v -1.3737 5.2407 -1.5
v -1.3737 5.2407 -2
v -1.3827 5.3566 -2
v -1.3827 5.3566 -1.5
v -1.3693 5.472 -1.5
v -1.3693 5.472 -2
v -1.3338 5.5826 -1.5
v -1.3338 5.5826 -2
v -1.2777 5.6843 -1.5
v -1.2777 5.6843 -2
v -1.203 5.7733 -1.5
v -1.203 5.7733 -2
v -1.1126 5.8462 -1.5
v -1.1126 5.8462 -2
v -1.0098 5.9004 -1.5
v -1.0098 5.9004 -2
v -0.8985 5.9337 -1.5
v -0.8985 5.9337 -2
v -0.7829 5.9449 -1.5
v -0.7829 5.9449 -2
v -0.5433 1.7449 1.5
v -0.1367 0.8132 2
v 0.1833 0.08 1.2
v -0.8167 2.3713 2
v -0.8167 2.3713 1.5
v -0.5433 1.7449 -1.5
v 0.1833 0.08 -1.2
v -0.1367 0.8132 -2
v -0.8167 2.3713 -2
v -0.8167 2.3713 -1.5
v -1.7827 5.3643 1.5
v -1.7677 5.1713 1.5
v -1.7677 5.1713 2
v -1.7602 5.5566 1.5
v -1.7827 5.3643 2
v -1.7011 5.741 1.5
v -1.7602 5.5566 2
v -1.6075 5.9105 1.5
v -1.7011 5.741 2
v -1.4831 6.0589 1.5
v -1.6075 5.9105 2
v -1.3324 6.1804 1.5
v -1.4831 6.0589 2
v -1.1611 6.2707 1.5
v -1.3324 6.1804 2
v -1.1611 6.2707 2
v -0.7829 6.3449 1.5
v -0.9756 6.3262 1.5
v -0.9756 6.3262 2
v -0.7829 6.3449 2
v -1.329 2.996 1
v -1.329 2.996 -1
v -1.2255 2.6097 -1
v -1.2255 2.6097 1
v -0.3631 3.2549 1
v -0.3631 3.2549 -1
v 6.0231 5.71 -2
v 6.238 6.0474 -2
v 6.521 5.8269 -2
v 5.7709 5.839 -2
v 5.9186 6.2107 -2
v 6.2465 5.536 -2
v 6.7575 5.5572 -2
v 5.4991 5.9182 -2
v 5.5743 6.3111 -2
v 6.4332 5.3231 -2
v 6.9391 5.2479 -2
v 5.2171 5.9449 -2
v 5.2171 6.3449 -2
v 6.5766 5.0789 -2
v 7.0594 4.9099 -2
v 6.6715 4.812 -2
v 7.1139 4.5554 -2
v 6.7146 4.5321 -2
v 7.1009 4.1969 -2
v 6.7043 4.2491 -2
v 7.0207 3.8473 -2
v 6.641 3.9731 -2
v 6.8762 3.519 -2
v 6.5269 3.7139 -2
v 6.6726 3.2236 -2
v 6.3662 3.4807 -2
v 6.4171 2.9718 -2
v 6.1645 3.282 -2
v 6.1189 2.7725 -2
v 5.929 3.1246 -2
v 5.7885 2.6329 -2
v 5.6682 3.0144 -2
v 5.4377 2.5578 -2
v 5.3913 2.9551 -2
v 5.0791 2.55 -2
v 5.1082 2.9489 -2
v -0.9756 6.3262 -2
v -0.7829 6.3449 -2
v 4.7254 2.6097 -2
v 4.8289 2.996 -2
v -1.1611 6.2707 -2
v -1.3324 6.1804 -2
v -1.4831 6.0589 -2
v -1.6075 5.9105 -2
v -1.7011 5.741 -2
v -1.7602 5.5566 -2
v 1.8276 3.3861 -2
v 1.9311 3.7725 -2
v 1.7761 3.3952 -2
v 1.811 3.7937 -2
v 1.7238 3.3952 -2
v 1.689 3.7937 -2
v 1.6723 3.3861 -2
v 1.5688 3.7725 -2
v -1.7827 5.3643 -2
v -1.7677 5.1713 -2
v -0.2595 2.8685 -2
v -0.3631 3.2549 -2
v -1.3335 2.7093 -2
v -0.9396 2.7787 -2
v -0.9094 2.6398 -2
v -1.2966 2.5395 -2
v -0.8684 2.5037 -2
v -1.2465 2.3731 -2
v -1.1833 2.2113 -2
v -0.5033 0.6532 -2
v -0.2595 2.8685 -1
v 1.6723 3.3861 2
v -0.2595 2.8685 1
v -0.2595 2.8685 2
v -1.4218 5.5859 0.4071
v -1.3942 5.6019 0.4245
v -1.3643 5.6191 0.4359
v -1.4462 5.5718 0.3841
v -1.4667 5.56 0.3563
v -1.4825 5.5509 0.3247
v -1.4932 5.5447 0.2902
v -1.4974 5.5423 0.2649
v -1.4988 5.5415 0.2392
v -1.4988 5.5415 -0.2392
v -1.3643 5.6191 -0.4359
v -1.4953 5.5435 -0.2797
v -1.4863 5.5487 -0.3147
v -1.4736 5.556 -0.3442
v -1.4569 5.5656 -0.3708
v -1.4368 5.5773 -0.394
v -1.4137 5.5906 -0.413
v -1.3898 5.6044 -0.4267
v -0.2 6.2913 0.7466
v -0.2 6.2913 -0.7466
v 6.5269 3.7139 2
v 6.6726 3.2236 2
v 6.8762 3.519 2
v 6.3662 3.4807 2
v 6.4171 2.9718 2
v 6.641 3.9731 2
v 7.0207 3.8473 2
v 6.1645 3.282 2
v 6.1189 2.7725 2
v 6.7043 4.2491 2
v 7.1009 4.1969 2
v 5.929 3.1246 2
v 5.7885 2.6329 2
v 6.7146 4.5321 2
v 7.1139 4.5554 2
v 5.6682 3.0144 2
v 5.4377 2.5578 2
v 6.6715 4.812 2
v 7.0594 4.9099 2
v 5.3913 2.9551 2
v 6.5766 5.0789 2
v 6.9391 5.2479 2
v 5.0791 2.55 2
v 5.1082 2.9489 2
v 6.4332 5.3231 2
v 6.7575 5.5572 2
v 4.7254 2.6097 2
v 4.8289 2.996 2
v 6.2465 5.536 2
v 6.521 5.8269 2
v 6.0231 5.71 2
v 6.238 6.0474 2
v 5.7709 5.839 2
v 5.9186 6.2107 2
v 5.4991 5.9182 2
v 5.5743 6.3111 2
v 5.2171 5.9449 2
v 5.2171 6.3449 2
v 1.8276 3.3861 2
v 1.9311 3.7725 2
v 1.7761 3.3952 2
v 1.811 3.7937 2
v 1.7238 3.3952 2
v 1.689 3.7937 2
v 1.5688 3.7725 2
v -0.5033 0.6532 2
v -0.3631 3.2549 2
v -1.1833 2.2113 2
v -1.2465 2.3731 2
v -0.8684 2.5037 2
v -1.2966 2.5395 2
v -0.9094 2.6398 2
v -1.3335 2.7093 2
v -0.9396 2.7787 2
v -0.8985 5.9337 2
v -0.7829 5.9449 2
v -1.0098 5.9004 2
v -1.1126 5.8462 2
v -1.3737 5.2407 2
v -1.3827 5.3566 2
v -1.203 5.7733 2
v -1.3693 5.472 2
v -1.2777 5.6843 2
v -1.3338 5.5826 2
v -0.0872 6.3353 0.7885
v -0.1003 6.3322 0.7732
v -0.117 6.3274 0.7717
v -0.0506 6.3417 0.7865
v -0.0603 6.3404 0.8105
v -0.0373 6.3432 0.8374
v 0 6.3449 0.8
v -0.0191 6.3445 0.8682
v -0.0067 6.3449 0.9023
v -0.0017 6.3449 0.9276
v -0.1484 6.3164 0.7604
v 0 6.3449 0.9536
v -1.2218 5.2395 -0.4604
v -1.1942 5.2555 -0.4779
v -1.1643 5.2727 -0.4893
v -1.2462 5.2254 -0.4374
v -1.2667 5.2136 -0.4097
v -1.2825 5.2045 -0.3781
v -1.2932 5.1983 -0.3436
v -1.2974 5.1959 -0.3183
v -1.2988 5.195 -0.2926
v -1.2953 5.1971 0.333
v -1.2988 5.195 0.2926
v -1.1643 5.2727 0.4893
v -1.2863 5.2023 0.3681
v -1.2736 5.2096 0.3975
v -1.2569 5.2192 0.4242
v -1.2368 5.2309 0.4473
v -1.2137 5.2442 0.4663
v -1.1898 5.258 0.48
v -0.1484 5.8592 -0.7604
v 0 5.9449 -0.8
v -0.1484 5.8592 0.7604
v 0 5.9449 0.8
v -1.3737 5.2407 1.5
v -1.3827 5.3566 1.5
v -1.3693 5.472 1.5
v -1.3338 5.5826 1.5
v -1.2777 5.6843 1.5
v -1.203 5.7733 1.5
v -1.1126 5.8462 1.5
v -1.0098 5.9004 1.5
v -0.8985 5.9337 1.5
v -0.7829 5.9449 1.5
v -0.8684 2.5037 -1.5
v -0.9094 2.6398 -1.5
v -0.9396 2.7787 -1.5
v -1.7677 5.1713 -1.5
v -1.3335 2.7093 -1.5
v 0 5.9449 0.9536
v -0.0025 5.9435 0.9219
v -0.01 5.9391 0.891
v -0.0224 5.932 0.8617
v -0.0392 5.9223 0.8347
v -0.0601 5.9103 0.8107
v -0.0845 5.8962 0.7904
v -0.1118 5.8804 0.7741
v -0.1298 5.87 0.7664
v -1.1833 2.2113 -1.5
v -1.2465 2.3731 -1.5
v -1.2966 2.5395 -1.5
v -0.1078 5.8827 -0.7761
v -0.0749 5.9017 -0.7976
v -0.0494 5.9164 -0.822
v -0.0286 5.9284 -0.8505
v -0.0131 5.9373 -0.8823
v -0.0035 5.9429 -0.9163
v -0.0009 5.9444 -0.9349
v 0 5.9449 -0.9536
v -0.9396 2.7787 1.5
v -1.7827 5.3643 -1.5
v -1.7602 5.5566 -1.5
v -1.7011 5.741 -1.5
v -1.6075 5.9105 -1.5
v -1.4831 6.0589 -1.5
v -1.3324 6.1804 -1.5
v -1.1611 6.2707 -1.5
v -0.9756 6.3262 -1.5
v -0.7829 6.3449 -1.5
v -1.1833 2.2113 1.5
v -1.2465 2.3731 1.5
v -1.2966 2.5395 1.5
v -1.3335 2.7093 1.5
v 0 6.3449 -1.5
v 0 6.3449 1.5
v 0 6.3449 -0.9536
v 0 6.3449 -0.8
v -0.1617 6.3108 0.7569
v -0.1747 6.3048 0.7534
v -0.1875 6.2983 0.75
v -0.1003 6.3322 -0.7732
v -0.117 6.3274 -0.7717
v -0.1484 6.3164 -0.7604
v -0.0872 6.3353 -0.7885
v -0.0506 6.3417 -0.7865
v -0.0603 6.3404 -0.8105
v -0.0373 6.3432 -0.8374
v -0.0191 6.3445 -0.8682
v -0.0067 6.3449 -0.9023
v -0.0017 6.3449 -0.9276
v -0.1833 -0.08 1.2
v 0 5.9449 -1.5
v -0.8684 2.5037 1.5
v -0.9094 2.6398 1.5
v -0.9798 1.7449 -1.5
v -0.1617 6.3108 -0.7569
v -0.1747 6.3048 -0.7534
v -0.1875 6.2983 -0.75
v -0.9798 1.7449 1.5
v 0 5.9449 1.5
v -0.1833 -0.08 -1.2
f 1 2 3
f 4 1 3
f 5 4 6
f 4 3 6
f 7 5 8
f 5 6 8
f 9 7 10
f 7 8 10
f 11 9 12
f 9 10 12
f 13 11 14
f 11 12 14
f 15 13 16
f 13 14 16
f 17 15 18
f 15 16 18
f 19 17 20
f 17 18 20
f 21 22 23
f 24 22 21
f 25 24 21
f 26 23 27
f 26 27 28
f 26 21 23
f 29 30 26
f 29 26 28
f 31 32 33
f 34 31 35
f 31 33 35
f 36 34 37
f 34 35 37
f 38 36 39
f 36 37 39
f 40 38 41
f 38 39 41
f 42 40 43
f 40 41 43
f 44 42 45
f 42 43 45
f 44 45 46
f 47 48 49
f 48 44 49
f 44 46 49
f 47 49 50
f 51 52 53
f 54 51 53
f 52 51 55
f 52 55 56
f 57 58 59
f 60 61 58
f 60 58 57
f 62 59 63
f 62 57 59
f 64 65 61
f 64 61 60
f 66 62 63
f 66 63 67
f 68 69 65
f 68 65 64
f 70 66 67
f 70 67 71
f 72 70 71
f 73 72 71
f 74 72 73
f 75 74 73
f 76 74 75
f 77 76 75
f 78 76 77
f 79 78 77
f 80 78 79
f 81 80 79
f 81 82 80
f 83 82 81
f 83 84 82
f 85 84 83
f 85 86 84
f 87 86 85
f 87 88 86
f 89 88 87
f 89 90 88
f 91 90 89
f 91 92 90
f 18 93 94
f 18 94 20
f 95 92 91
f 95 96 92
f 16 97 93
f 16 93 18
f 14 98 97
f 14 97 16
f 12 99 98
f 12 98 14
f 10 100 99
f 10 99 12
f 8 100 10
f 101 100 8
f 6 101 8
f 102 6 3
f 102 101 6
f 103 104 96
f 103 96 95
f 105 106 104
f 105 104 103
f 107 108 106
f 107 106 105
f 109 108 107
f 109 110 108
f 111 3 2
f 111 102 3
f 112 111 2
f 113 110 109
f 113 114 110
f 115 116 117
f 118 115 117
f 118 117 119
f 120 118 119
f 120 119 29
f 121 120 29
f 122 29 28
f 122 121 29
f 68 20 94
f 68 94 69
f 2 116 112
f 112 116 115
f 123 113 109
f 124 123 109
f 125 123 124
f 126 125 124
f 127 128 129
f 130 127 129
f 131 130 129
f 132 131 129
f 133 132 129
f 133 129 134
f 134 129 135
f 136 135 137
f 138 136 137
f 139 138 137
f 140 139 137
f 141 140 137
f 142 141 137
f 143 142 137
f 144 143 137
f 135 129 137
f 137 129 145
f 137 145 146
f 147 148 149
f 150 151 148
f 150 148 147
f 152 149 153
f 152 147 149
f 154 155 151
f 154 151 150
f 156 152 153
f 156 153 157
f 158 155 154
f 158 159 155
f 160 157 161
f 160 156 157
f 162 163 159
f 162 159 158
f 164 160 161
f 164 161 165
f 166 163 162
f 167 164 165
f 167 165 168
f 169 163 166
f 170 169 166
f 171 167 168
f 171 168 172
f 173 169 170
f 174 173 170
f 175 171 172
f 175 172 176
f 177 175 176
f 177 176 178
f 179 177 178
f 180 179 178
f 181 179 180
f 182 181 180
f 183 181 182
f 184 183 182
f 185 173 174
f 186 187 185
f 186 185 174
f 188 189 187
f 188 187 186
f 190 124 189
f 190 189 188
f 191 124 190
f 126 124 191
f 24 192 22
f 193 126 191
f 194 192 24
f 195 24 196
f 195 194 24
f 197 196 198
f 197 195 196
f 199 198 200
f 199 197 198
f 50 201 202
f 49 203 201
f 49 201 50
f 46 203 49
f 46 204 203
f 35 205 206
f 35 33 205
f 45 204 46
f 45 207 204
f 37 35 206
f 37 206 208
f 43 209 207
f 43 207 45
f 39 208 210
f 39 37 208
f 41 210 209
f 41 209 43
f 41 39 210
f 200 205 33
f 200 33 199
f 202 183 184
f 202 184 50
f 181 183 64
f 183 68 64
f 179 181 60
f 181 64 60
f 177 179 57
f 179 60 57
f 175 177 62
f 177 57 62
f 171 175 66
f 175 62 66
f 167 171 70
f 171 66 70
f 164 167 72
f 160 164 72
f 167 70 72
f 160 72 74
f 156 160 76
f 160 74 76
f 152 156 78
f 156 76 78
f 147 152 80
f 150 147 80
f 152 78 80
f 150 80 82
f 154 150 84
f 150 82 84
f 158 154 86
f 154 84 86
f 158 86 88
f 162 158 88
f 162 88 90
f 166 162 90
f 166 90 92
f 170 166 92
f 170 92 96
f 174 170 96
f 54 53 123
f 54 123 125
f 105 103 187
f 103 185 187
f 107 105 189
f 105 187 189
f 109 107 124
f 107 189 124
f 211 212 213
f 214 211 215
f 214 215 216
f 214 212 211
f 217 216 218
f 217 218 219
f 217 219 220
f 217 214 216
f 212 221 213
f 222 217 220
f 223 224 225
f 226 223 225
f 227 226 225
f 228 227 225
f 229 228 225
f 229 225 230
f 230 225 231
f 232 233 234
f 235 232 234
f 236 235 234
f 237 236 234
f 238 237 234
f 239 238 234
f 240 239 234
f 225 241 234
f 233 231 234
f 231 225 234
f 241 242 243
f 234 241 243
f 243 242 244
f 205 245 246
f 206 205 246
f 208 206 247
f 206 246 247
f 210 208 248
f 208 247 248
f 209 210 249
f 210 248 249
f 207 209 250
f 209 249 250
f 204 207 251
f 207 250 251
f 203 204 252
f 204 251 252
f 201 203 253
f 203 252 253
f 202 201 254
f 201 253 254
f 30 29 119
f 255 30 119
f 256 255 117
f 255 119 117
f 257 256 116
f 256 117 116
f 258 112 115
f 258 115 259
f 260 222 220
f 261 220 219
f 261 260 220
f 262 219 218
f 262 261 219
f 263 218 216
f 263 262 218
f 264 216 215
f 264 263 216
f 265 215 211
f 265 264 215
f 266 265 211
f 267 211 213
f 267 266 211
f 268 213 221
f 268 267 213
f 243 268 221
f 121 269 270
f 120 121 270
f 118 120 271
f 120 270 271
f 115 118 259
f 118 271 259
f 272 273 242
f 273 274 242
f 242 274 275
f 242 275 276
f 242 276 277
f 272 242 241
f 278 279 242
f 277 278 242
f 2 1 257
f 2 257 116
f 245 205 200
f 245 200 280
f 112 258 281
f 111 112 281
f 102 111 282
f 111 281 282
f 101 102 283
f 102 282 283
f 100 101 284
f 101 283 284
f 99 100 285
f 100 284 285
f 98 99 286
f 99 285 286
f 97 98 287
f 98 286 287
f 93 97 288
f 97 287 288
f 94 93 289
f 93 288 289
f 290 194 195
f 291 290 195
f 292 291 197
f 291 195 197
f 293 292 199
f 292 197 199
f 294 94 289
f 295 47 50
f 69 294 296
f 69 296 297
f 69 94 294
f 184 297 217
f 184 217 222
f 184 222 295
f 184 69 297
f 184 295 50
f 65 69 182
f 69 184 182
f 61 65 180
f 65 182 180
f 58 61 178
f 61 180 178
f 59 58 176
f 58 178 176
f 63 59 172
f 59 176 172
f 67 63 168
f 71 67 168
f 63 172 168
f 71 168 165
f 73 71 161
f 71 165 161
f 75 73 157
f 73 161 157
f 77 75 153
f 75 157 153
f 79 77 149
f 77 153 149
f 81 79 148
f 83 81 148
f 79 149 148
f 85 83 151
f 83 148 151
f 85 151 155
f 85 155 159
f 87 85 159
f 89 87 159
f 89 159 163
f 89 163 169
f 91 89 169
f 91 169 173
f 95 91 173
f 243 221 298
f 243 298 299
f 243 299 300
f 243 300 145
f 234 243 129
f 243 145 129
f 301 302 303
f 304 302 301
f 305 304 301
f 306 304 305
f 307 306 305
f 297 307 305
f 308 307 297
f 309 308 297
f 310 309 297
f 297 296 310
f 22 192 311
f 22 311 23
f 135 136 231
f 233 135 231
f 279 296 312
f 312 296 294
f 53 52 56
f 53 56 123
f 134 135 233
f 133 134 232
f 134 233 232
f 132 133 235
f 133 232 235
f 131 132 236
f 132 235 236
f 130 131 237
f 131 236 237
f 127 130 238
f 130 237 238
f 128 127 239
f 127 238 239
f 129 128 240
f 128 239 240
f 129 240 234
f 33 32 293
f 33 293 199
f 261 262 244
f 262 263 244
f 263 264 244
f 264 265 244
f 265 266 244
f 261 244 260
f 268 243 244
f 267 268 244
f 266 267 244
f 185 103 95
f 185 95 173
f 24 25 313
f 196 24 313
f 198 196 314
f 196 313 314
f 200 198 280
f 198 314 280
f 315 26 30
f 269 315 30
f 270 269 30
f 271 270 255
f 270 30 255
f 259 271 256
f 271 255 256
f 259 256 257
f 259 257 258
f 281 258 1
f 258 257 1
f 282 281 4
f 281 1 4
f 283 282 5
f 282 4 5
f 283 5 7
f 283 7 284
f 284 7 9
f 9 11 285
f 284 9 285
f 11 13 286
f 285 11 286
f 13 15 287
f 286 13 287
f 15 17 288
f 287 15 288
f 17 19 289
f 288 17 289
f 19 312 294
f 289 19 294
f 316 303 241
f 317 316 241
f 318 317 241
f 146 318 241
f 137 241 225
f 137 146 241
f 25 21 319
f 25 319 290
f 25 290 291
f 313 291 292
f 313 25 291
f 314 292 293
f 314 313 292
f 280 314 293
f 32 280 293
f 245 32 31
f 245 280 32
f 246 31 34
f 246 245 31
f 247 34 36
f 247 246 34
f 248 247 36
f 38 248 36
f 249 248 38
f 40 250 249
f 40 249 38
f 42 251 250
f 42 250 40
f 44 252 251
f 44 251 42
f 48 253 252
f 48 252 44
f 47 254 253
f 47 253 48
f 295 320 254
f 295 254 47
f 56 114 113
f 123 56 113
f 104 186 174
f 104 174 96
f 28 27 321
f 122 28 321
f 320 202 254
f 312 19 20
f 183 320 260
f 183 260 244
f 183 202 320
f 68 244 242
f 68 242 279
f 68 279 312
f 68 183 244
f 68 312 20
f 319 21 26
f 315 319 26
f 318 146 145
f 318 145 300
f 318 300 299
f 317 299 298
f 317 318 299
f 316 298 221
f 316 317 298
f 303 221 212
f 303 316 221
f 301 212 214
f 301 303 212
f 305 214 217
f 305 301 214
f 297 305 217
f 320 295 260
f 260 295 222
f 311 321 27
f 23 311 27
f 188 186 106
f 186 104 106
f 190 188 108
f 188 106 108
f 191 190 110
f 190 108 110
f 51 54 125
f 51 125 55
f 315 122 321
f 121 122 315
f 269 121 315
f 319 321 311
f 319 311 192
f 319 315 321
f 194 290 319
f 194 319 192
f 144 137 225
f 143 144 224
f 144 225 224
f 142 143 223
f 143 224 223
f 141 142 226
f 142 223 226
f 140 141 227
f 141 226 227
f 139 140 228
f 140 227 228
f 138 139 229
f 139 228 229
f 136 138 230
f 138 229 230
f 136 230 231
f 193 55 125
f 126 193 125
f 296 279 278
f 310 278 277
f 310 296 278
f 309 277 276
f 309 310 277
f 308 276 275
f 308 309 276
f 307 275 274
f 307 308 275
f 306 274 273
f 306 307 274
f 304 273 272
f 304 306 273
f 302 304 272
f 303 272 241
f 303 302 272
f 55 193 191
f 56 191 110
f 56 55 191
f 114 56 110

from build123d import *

# Parameters (mm, degrees)
MAINPROFILES_W         = 0.4
MAINPROFILES_H         = 4
CONNECTIONACCESS_REACH = 11.742
CONNECTIONACCESSS_W    = 3
CONNECTIONACCESSS_H    = 4.6
ENDPROFILES_W          = 4
ENDPROFILES_H          = 0.4
ENDCONNECTIONS_W       = 2
ENDCONNECTIONS_H       = 0.4
LOCKINGTABS_W          = 1.6
LOCKINGTABS_H          = 0.4
LTCUT_REACH            = 10.24
LTCUTF_R               = 0.2
MPC_SIZE               = 0.8


with BuildPart() as part:
    # MainProfile: sweep along a path in MainProfilePath
    with BuildLine(Plane.XY) as mainprofile_path:
        Line((0, 0), (-1, 2.291287847))
        ThreePointArc((-1, 2.291287847), (-1.081718762, 2.513588866), (-1.136585228, 2.743991492))
        Line((-1.136585228, 2.743991492), (-1.570705672, 5.206010875))
        ThreePointArc((-1.570705672, 5.206010875), (-1.395695024, 5.859159505), (-0.78285947, 6.144929417))
        Line((-0.78285947, 6.144929417), (5.21714053, 6.144929417))
        ThreePointArc((5.21714053, 6.144929417), (6.902596795, 4.22303489), (4.777148154, 2.802855512))
        Line((4.777148154, 2.802855512), (1.879370675, 3.579312647))
        ThreePointArc((1.879370675, 3.579312647), (1.749961152, 3.596349734), (1.62055163, 3.579312647))
    # MainProfileS → MainProfile (sweep)
    with BuildSketch(Plane(origin=(0, 0, 0), x_dir=(0.9165151389911679, 0.4000000000000004, 0), z_dir=(-0.4000000000000004, 0.9165151389911679, 0))):
        Rectangle(MAINPROFILES_W, MAINPROFILES_H)
    sweep(path=mainprofile_path.line)

    # ConnectionAccessS → ConnectionAccess (cut, up to next)
    with BuildSketch(Plane(origin=(0, 0, 0), x_dir=(0, 0, -1), z_dir=(1, 0, 0)), mode=Mode.PRIVATE) as connectionaccess_sk1:
        with Locations((0, 4.044929417)):
            Rectangle(CONNECTIONACCESSS_W, CONNECTIONACCESSS_H)
    connectionaccess_tool1 = extrude(connectionaccess_sk1.sketch, amount=-CONNECTIONACCESS_REACH, mode=Mode.PRIVATE) & part.part
    add(connectionaccess_tool1.solids().sort_by_distance((0, 4.044929, 0))[0], mode=Mode.SUBTRACT)

    # EndProfile: sweep along a path in EndProfilePath
    with BuildLine(Plane.XY) as endprofile_path:
        Line((1.62055163, 3.579312647), (-0.311300023, 3.061674557))
    # EndProfileS → EndProfile (sweep)
    with BuildSketch(Plane(origin=(2.406823416, 0.644906391, 0), x_dir=(0, 0, 1), z_dir=(-0.9659258262890702, -0.2588190451025136, 0))):
        with Locations((0, 3.037920901)):
            Rectangle(ENDPROFILES_W, ENDPROFILES_H)
    sweep(path=endprofile_path.line)

    # EndConnection: sweep along a path in EndConnectionPath
    with BuildLine(Plane.XY) as endconnection_path:
        Line((-0.311300023, 3.061674557), (-1.277225849, 2.802855512))
    # EndConnectionS → EndConnection (sweep)
    with BuildSketch(Plane(origin=(0.474971764, 0.127268301, 0), x_dir=(0, 0, 1), z_dir=(-0.9659258262890702, -0.2588190451025135, 0))):
        with Locations((0, 3.037920901)):
            Rectangle(ENDCONNECTIONS_W, ENDCONNECTIONS_H)
    sweep(path=endconnection_path.line)

    # LockingTab: sweep along a path in LockingTabPath
    with BuildLine(Plane.XY) as lockingtab_path:
        Line((-1.398843786, 5.368246688), (-0.1, 6.118134498))
        ThreePointArc((-0.1, 6.118134498), (-0.051763809, 6.138114582), (0, 6.144929417))
    # LockingTabS → LockingTab (sweep)
    with BuildSketch(Plane.ZY):
        with Locations((0, 6.144929417)):
            Rectangle(LOCKINGTABS_W, LOCKINGTABS_H)
    sweep(path=lockingtab_path.line)

    # LTCutS → LTCut (cut, up to next)
    with BuildSketch(Plane(origin=(2.972464708, 6.344929417, 0), x_dir=(-1, 0, 0), z_dir=(0, -1, 0)), mode=Mode.PRIVATE) as ltcut_sk1:
        Polygon((2.972464708, 0.8), (4.471308495, 0.4), (4.471308495, 0.8), align=None)
    ltcut_tool1 = extrude(ltcut_sk1.sketch, amount=LTCUT_REACH, mode=Mode.PRIVATE) & part.part
    ltcut = ltcut_tool1.solids().sort_by_distance((-0.999229, 6.344929, -0.666667))[0]
    add(ltcut, mode=Mode.SUBTRACT)

    # LTCutHM: LTCut across plane
    add(ltcut.mirror(Plane.XY), mode=Mode.SUBTRACT)

    # LTCutF
    # the kernel refuses this fillet: 0.2 mm, written as the material it adds along each edge
    with BuildSketch(Plane(origin=(0, 5.560866603, 0.8), x_dir=(0, 0, 1), z_dir=(0, 1, 0))) as ltcutf_piece_1_section:
        with BuildLine():
            CenterArc((LTCUTF_R * 0.768125627693, -LTCUTF_R), LTCUTF_R, 90, 75.05757969)
            Line((-LTCUTF_R * 0.198059812329, -LTCUTF_R * 0.742151797585), (0, 0))
            Line((0, 0), (LTCUTF_R * 0.768125627693, 0))
        make_face()
    ltcutf_piece_1 = extrude(amount=1.168125628, mode=Mode.PRIVATE)
    ltcutf_piece_1 = split(ltcutf_piece_1, bisect_by=Plane(origin=(-0.048441187, 5.916961885, 0.804118212), z_dir=(-0.4999999999999946, 0.8660254037844418, 0)), keep=Keep.TOP, mode=Mode.PRIVATE)
    ltcutf_piece_1 = ltcutf_piece_1 & Plane(origin=(0, 5.944929417, 0.804118212), x_dir=(-0.5000000000000254, 0.8660254037844239, 0), z_dir=(0, 0, -1)) * Cylinder(0.4, 3, mode=Mode.PRIVATE)
    add(ltcutf_piece_1)
    with BuildSketch(Plane(origin=(0, 6.728992231, -0.8), x_dir=(0, 0, -1), z_dir=(0, -1, 0))) as ltcutf_piece_2_section:
        with BuildLine():
            CenterArc((LTCUTF_R * 0.768125627693, -LTCUTF_R), LTCUTF_R, 90, 75.05757969)
            Line((-LTCUTF_R * 0.198059812329, -LTCUTF_R * 0.742151797585), (0, 0))
            Line((0, 0), (LTCUTF_R * 0.768125627693, 0))
        make_face()
    ltcutf_piece_2 = extrude(amount=1.168125628, mode=Mode.PRIVATE)
    ltcutf_piece_2 = split(ltcutf_piece_2, bisect_by=Plane(origin=(0.062272653, 5.98088255, -0.82477541), z_dir=(-0.4999999999999946, 0.8660254037844418, 0)), keep=Keep.TOP, mode=Mode.PRIVATE)
    ltcutf_piece_2 = ltcutf_piece_2 & Plane(origin=(0, 5.944929417, -0.82477541), x_dir=(-0.5000000000000254, 0.8660254037844239, 0), z_dir=(0, 0, -1)) * Cylinder(0.4, 3, mode=Mode.PRIVATE)
    add(ltcutf_piece_2)
    # the kernel refuses this fillet: 0.2 mm, written as the material it takes off along each edge
    with BuildSketch(Plane(origin=(-1.101389565, 4.853040863, 0.506069552), x_dir=(0.8293899797947963, 0.5129525340785382, 0.22134127314713234), z_dir=(-0.49560726984934556, 0.8584169719794723, -0.13226388883618956)), Plane(origin=(-1.101389565, 4.853040863, -0.506069552), x_dir=(0.06613194441810266, -0.11454388773545661, 0.9912145396986104), z_dir=(-0.49560726984934556, 0.8584169719794723, 0.13226388883618956))) as ltcutf_2_piece_1:
        with BuildLine():
            CenterArc((LTCUTF_R * 0.796817292686, LTCUTF_R), LTCUTF_R, 192.903114006, 77.096885994)
            Line((-LTCUTF_R * 0.1779317665, LTCUTF_R * 0.776696906389), (0, 0))
            Line((0, 0), (LTCUTF_R * 0.796817292686, 0))
        make_face()
    extrude(amount=1.200362624, mode=Mode.SUBTRACT)

    # MPC
    mpc_edges = [part.edges().sort_by_distance(p)[0] for p in [
        (0, 0, -2),
        (0, 0, 2),
    ]]
    chamfer(mpc_edges, length=MPC_SIZE)


solid = part.part
